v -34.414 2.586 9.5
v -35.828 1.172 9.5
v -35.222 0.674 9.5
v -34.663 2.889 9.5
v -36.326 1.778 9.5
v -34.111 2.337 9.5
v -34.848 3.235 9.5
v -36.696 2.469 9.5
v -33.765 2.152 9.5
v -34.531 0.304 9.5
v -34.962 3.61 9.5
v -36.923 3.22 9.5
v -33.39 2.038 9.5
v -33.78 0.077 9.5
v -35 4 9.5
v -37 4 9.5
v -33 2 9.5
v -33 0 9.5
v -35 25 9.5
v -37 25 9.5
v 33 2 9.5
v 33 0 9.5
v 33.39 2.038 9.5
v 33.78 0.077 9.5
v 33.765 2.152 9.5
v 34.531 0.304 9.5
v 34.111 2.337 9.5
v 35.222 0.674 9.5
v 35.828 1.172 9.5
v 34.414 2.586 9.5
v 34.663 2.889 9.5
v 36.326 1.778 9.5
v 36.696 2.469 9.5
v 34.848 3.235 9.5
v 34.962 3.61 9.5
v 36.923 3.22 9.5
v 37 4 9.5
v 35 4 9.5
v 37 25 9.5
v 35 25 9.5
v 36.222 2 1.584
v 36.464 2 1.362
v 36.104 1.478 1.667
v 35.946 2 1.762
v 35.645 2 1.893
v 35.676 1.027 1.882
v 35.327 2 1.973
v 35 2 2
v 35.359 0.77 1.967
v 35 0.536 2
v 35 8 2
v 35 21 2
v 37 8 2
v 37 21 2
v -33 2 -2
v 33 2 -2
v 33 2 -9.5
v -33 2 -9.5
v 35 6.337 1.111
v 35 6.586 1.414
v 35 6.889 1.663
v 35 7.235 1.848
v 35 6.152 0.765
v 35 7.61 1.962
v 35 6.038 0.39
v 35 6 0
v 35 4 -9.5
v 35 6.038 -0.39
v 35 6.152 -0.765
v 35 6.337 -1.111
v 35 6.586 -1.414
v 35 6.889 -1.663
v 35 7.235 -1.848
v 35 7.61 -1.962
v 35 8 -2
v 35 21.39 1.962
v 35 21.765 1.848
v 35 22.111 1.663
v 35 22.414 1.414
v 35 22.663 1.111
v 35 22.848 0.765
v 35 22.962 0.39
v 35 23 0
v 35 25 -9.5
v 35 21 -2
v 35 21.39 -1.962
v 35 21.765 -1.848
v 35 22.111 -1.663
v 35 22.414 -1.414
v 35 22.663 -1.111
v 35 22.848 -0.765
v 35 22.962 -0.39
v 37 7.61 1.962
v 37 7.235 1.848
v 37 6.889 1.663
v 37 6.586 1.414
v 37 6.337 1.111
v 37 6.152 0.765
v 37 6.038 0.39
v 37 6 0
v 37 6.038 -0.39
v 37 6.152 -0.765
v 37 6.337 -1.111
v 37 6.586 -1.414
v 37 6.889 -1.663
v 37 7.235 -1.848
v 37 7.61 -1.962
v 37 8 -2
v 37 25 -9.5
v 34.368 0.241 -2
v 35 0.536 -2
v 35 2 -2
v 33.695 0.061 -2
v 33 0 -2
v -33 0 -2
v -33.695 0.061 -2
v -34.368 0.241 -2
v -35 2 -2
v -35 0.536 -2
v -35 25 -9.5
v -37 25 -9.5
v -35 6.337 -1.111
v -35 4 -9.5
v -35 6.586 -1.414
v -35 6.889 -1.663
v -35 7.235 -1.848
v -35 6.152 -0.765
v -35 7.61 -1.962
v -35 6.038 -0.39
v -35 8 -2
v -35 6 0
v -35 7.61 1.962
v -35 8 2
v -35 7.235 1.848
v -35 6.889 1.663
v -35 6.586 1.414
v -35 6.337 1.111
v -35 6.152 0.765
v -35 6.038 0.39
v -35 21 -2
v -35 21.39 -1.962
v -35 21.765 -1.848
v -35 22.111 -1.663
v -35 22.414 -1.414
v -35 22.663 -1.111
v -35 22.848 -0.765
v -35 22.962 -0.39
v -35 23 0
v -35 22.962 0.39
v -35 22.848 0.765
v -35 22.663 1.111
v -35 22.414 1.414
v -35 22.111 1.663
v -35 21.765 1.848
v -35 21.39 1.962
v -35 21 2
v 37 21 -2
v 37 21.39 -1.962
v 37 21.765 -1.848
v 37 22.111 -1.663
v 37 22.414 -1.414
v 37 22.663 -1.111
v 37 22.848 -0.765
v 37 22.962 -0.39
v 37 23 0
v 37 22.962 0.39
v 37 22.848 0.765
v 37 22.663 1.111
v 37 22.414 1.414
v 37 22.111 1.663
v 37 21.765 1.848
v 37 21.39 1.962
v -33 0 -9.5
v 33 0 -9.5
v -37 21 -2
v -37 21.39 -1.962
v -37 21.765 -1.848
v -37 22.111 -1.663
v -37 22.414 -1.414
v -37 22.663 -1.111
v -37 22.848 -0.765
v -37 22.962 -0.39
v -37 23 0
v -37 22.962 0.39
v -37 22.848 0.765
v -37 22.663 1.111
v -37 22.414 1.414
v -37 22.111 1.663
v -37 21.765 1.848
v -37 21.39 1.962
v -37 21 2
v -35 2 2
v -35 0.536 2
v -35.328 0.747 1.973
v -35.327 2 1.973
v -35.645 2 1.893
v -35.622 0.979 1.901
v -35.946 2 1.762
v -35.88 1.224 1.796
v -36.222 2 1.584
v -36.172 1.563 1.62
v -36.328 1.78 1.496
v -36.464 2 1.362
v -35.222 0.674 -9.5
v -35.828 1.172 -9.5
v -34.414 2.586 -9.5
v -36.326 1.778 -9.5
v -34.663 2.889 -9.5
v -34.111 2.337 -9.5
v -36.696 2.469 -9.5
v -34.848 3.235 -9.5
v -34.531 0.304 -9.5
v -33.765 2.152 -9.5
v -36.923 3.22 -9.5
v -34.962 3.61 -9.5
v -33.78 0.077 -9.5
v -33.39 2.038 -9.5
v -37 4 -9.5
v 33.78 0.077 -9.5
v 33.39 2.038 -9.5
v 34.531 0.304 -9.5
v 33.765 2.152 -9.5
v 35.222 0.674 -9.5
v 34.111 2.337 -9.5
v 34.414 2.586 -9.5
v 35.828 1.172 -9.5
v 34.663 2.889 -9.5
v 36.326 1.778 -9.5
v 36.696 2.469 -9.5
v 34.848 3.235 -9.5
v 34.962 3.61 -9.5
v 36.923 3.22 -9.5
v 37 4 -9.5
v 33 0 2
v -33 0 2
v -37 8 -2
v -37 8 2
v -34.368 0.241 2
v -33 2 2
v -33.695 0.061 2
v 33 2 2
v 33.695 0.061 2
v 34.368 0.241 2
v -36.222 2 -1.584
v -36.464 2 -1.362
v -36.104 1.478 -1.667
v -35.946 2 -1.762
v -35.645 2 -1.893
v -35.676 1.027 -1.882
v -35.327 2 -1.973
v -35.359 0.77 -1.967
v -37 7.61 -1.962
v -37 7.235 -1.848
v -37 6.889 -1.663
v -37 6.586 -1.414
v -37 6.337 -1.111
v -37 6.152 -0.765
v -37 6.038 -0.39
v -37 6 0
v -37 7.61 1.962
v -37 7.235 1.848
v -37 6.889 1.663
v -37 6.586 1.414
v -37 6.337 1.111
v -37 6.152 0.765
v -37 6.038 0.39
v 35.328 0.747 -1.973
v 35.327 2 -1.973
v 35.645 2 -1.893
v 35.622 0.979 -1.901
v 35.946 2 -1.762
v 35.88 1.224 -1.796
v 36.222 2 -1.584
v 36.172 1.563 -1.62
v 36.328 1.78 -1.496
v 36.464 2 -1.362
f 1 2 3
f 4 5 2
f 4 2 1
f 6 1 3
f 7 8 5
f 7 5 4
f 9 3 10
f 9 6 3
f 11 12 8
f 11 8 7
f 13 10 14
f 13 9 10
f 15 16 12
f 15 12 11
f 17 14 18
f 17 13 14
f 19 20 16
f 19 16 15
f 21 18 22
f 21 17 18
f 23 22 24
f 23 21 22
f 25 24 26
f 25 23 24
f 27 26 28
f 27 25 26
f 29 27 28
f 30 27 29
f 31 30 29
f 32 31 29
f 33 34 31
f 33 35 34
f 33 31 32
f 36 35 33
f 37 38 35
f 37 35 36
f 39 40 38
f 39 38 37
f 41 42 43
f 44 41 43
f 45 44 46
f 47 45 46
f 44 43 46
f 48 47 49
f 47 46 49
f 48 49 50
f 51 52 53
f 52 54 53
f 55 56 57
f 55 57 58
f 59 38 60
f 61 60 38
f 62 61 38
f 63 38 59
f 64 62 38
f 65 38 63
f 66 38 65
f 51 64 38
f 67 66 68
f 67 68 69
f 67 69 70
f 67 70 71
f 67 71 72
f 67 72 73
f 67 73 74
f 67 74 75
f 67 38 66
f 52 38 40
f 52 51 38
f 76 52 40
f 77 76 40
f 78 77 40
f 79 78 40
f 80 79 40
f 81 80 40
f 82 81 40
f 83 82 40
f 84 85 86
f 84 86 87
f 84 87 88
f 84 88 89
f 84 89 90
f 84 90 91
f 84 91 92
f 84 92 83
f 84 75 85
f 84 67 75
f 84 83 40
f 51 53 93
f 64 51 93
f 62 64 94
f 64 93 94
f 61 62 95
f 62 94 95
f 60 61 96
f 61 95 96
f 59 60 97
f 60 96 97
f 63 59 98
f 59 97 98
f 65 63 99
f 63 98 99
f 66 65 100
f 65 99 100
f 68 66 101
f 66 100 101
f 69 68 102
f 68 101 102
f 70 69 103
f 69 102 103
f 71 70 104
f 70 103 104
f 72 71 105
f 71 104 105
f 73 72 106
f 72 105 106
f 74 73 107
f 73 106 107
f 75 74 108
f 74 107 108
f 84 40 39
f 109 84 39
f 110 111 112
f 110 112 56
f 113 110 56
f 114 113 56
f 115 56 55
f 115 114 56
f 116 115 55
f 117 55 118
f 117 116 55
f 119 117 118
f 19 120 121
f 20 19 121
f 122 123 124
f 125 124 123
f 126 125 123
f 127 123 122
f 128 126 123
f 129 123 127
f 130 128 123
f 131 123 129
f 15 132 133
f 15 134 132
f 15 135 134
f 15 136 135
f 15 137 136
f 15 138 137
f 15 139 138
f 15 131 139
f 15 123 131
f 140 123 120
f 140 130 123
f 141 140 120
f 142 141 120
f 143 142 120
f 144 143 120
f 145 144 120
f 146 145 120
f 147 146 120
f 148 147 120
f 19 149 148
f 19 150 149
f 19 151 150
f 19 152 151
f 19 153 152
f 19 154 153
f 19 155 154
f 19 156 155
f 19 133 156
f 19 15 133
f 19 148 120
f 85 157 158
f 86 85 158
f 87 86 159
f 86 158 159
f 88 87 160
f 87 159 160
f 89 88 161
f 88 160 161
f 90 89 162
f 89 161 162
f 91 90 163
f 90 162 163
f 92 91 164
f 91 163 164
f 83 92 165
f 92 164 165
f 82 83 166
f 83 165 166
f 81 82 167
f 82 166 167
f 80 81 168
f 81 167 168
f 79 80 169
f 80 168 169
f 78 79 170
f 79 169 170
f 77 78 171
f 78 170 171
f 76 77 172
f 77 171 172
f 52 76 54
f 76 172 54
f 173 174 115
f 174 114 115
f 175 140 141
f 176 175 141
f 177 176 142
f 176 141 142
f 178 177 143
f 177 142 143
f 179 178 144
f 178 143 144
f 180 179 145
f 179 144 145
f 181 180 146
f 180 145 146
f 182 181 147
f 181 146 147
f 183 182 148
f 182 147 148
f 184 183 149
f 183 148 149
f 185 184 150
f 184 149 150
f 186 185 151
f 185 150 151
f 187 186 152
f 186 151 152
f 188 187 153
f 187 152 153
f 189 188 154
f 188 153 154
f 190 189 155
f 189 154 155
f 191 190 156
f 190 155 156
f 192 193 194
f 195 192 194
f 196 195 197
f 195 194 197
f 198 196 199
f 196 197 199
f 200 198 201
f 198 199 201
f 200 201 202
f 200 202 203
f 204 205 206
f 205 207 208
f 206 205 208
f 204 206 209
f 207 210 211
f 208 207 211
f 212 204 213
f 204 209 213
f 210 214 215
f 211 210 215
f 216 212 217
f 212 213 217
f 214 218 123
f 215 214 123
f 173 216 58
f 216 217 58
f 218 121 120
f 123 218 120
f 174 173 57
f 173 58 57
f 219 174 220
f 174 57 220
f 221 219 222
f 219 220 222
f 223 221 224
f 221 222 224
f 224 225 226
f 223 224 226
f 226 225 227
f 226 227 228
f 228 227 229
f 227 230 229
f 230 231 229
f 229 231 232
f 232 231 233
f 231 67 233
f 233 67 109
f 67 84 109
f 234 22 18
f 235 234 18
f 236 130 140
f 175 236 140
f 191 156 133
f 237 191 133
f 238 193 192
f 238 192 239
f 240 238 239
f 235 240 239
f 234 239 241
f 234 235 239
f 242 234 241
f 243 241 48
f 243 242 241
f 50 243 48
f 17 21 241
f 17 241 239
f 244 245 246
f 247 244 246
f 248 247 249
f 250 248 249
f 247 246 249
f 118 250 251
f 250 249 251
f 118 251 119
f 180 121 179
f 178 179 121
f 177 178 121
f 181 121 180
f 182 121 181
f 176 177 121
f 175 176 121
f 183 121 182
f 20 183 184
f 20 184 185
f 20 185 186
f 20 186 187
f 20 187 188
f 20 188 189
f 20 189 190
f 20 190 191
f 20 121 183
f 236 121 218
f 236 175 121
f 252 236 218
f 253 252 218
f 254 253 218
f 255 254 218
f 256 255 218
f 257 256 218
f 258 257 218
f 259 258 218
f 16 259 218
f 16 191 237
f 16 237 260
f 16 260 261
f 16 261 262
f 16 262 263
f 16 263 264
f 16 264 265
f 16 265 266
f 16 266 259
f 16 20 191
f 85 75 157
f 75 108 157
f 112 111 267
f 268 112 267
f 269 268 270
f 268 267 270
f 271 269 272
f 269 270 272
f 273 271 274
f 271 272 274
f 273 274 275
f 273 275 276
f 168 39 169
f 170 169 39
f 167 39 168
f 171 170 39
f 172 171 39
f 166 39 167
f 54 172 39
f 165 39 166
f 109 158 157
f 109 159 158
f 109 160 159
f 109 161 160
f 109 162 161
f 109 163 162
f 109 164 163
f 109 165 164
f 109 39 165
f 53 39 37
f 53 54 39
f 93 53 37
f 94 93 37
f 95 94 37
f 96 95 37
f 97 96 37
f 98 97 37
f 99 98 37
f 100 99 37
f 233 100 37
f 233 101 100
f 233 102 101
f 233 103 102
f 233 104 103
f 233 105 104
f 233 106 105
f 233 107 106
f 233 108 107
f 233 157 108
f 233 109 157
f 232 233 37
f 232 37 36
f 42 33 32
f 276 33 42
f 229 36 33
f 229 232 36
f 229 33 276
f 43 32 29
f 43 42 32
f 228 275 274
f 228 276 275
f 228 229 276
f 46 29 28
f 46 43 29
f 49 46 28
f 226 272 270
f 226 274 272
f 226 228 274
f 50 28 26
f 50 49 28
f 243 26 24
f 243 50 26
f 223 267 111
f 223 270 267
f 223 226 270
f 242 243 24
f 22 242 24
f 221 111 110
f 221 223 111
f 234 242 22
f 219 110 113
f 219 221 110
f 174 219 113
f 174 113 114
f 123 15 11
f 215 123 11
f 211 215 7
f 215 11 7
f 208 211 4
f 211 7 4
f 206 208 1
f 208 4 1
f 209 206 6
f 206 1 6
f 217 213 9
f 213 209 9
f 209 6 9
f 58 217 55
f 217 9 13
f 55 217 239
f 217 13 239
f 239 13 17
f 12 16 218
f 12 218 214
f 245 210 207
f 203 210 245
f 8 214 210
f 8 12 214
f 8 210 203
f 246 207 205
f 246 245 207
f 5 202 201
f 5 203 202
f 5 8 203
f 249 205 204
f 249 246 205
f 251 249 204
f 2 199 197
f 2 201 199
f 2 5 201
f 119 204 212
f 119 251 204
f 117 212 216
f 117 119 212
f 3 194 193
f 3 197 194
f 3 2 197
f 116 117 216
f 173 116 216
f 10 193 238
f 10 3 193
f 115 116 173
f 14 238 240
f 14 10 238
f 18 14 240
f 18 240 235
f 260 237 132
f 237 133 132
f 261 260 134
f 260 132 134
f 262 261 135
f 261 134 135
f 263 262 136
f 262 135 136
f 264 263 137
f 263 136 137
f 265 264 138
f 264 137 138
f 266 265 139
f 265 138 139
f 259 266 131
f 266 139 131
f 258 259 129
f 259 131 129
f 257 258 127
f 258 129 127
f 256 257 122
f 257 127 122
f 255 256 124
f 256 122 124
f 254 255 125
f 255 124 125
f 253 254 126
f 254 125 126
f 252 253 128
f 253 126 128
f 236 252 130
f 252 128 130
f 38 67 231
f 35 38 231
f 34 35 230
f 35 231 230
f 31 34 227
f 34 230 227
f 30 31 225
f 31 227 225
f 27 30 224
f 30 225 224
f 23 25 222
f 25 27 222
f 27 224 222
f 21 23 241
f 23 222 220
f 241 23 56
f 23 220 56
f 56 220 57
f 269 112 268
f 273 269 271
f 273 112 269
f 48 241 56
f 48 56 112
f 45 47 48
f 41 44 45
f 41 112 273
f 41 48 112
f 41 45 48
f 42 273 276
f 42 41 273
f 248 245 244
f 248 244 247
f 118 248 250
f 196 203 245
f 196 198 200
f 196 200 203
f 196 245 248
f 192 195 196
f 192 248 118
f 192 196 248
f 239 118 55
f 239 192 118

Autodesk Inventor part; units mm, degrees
ref_plane "YZ Plane" through (0, 0, 0) normal (1, 0, 0) x (0, 1, 0)
ref_plane "XZ Plane" through (0, 0, 0) normal (0, 1, 0) x (-1, 0, 0)
ref_plane "XY Plane" through (0, 0, 0) normal (0, 0, 1) x (1, 0, 0)
sketch "スケッチ1" plane through (0, 0, 0) normal (0, 1, 0) x (-1, 0, 0)
  line L0 (-37, -9.5) -> (37, -9.5)
  line L1 (37, -9.5) -> (37, 9.5)
  line L2 (37, 9.5) -> (-37, 9.5)
  line L3 (-37, 9.5) -> (-37, -9.5)
  line L4 (-37, -9.5) -> (37, 9.5) construction
  line L5 (37, -9.5) -> (-37, 9.5) construction
  point P0 (0, 0)
  dimension "d0" = 74
  dimension "d1" = 19
extrude "プレート1" add sketch "スケッチ1" along normal blind 2
sketch "スケッチ2" plane through (35, 0, -9.5) normal (1, 0, 0) x (0, 1, 0)
  line L0 (0, 19) -> (0, 0)
  line L1 (0, 0) -> (25, 0)
  line L2 (25, 0) -> (25, 19)
  line L3 (25, 19) -> (0, 19)
edge flange "フランジ1" height 25 angle 90 thickness 2 bend radius 2 thickness toward (1, 0, 0) relief tear relief width 2 relief depth 1 edges at (37, 2, 0) wall of the first edge with corners at (35, 0, 9.5) (35, 0, -9.5) (35, 25, -9.5) (35, 25, 9.5)
bend "曲げ1"
corner "コーナー1"
sketch "スケッチ3" plane through (-35, 0, 9.5) normal (-1, 0, 0) x (0, -1, 0)
  line L0 (0, -19) -> (0, 0)
  line L1 (0, 0) -> (-25, 0)
  line L2 (-25, 0) -> (-25, -19)
  line L3 (-25, -19) -> (0, -19)
edge flange "フランジ2" height 25 angle 90 thickness 2 bend radius 2 thickness toward (-1, 0, 0) relief tear relief width 2 relief depth 1 edges at (-37, 2, 0) wall of the first edge with corners at (-35, 0, -9.5) (-35, 0, 9.5) (-35, 25, 9.5) (-35, 25, -9.5)
bend "曲げ2"
corner "コーナー2"
sketch "スケッチ5" plane through (0, 0, 0) normal (0, -1, 0) x (1, 0, 0)
  arc A0 (-35, 2) -> (-35, -2) centre (-35, 0) ccw
  arc A1 (35, -2) -> (35, 2) centre (35, 0) ccw
  line L0 (-35, 2) -> (35, 2)
  line L1 (35, -2) -> (-35, -2)
  point P0 (0, 0)
  dimension "d31" = 4
  dimension "d32" = 2
  dimension "d33" = 2
  dimension "d34" = 2
  dimension "d35" = 35
  dimension "d36" = 35
extrude "押し出し1" cut sketch "スケッチ5" against normal blind 2
sketch "スケッチ6" plane through (37, 25, 9.5) normal (1, 0, 0) x (0, 0, -1)
  point P0 (9.5, -25)
sketch "スケッチ7" plane through (37, 25, 9.5) normal (1, 0, 0) x (0, 0, -1)
  line L0 (7.5, -4) -> (7.5, -17)
  arc A0 (7.5, -17) -> (11.5, -17) centre (9.5, -17) ccw
  line L1 (11.5, -17) -> (11.5, -4)
  arc A1 (11.5, -4) -> (7.5, -4) centre (9.5, -4) ccw
  line L2 (0, 0) -> (19, 0) projected
  line L3 (0, -21) -> (19, -21) projected
  point P0 (9.5, -25)
  point P1 (9.5, 0)
  dimension "d45" = 4
  dimension "d46" = 4
  dimension "d47" = 2
extrude "押し出し2" cut sketch "スケッチ7" against normal blind 100
equation "\"d2\" = Thickness"
equation "\"d3\" = BendReliefWidth"
equation "\"d4\" = BendReliefDepth"
equation "\"d5\" = MinimumRemnant"
equation "\"d6\" = TransitionRadius"
equation "\"d9\" = BendRadius"
equation "\"d10\" = CornerReliefSize"
equation "\"d11\" = GapSize"
equation "\"d12\" = JacobiRadiusSize"
equation "\"d13\" = BendReliefWidth"
equation "\"d14\" = BendReliefDepth"
equation "\"d15\" = MinimumRemnant"
equation "\"d16\" = TransitionRadius"
equation "\"d19\" = BendRadius"
equation "\"d20\" = CornerReliefSize"
equation "\"d21\" = GapSize"
equation "\"d22\" = JacobiRadiusSize"
equation "\"BendRadius\" = Thickness"
equation "\"BendReliefWidth\" = Thickness"
equation "\"BendReliefDepth\" = 0.5 * Thickness"
equation "\"CornerReliefSize\" = 4 * Thickness"
equation "\"MinimumRemnant\" = 2 * Thickness"
equation "\"TransitionRadius\" = BendRadius"
equation "\"JacobiRadiusSize\" = BendRadius"
equation "\"GapSize\" = Thickness"
equation "\"Thickness\" = 2"
properties part number "main_key_cup_col0" material "アルミニウム 6061"
